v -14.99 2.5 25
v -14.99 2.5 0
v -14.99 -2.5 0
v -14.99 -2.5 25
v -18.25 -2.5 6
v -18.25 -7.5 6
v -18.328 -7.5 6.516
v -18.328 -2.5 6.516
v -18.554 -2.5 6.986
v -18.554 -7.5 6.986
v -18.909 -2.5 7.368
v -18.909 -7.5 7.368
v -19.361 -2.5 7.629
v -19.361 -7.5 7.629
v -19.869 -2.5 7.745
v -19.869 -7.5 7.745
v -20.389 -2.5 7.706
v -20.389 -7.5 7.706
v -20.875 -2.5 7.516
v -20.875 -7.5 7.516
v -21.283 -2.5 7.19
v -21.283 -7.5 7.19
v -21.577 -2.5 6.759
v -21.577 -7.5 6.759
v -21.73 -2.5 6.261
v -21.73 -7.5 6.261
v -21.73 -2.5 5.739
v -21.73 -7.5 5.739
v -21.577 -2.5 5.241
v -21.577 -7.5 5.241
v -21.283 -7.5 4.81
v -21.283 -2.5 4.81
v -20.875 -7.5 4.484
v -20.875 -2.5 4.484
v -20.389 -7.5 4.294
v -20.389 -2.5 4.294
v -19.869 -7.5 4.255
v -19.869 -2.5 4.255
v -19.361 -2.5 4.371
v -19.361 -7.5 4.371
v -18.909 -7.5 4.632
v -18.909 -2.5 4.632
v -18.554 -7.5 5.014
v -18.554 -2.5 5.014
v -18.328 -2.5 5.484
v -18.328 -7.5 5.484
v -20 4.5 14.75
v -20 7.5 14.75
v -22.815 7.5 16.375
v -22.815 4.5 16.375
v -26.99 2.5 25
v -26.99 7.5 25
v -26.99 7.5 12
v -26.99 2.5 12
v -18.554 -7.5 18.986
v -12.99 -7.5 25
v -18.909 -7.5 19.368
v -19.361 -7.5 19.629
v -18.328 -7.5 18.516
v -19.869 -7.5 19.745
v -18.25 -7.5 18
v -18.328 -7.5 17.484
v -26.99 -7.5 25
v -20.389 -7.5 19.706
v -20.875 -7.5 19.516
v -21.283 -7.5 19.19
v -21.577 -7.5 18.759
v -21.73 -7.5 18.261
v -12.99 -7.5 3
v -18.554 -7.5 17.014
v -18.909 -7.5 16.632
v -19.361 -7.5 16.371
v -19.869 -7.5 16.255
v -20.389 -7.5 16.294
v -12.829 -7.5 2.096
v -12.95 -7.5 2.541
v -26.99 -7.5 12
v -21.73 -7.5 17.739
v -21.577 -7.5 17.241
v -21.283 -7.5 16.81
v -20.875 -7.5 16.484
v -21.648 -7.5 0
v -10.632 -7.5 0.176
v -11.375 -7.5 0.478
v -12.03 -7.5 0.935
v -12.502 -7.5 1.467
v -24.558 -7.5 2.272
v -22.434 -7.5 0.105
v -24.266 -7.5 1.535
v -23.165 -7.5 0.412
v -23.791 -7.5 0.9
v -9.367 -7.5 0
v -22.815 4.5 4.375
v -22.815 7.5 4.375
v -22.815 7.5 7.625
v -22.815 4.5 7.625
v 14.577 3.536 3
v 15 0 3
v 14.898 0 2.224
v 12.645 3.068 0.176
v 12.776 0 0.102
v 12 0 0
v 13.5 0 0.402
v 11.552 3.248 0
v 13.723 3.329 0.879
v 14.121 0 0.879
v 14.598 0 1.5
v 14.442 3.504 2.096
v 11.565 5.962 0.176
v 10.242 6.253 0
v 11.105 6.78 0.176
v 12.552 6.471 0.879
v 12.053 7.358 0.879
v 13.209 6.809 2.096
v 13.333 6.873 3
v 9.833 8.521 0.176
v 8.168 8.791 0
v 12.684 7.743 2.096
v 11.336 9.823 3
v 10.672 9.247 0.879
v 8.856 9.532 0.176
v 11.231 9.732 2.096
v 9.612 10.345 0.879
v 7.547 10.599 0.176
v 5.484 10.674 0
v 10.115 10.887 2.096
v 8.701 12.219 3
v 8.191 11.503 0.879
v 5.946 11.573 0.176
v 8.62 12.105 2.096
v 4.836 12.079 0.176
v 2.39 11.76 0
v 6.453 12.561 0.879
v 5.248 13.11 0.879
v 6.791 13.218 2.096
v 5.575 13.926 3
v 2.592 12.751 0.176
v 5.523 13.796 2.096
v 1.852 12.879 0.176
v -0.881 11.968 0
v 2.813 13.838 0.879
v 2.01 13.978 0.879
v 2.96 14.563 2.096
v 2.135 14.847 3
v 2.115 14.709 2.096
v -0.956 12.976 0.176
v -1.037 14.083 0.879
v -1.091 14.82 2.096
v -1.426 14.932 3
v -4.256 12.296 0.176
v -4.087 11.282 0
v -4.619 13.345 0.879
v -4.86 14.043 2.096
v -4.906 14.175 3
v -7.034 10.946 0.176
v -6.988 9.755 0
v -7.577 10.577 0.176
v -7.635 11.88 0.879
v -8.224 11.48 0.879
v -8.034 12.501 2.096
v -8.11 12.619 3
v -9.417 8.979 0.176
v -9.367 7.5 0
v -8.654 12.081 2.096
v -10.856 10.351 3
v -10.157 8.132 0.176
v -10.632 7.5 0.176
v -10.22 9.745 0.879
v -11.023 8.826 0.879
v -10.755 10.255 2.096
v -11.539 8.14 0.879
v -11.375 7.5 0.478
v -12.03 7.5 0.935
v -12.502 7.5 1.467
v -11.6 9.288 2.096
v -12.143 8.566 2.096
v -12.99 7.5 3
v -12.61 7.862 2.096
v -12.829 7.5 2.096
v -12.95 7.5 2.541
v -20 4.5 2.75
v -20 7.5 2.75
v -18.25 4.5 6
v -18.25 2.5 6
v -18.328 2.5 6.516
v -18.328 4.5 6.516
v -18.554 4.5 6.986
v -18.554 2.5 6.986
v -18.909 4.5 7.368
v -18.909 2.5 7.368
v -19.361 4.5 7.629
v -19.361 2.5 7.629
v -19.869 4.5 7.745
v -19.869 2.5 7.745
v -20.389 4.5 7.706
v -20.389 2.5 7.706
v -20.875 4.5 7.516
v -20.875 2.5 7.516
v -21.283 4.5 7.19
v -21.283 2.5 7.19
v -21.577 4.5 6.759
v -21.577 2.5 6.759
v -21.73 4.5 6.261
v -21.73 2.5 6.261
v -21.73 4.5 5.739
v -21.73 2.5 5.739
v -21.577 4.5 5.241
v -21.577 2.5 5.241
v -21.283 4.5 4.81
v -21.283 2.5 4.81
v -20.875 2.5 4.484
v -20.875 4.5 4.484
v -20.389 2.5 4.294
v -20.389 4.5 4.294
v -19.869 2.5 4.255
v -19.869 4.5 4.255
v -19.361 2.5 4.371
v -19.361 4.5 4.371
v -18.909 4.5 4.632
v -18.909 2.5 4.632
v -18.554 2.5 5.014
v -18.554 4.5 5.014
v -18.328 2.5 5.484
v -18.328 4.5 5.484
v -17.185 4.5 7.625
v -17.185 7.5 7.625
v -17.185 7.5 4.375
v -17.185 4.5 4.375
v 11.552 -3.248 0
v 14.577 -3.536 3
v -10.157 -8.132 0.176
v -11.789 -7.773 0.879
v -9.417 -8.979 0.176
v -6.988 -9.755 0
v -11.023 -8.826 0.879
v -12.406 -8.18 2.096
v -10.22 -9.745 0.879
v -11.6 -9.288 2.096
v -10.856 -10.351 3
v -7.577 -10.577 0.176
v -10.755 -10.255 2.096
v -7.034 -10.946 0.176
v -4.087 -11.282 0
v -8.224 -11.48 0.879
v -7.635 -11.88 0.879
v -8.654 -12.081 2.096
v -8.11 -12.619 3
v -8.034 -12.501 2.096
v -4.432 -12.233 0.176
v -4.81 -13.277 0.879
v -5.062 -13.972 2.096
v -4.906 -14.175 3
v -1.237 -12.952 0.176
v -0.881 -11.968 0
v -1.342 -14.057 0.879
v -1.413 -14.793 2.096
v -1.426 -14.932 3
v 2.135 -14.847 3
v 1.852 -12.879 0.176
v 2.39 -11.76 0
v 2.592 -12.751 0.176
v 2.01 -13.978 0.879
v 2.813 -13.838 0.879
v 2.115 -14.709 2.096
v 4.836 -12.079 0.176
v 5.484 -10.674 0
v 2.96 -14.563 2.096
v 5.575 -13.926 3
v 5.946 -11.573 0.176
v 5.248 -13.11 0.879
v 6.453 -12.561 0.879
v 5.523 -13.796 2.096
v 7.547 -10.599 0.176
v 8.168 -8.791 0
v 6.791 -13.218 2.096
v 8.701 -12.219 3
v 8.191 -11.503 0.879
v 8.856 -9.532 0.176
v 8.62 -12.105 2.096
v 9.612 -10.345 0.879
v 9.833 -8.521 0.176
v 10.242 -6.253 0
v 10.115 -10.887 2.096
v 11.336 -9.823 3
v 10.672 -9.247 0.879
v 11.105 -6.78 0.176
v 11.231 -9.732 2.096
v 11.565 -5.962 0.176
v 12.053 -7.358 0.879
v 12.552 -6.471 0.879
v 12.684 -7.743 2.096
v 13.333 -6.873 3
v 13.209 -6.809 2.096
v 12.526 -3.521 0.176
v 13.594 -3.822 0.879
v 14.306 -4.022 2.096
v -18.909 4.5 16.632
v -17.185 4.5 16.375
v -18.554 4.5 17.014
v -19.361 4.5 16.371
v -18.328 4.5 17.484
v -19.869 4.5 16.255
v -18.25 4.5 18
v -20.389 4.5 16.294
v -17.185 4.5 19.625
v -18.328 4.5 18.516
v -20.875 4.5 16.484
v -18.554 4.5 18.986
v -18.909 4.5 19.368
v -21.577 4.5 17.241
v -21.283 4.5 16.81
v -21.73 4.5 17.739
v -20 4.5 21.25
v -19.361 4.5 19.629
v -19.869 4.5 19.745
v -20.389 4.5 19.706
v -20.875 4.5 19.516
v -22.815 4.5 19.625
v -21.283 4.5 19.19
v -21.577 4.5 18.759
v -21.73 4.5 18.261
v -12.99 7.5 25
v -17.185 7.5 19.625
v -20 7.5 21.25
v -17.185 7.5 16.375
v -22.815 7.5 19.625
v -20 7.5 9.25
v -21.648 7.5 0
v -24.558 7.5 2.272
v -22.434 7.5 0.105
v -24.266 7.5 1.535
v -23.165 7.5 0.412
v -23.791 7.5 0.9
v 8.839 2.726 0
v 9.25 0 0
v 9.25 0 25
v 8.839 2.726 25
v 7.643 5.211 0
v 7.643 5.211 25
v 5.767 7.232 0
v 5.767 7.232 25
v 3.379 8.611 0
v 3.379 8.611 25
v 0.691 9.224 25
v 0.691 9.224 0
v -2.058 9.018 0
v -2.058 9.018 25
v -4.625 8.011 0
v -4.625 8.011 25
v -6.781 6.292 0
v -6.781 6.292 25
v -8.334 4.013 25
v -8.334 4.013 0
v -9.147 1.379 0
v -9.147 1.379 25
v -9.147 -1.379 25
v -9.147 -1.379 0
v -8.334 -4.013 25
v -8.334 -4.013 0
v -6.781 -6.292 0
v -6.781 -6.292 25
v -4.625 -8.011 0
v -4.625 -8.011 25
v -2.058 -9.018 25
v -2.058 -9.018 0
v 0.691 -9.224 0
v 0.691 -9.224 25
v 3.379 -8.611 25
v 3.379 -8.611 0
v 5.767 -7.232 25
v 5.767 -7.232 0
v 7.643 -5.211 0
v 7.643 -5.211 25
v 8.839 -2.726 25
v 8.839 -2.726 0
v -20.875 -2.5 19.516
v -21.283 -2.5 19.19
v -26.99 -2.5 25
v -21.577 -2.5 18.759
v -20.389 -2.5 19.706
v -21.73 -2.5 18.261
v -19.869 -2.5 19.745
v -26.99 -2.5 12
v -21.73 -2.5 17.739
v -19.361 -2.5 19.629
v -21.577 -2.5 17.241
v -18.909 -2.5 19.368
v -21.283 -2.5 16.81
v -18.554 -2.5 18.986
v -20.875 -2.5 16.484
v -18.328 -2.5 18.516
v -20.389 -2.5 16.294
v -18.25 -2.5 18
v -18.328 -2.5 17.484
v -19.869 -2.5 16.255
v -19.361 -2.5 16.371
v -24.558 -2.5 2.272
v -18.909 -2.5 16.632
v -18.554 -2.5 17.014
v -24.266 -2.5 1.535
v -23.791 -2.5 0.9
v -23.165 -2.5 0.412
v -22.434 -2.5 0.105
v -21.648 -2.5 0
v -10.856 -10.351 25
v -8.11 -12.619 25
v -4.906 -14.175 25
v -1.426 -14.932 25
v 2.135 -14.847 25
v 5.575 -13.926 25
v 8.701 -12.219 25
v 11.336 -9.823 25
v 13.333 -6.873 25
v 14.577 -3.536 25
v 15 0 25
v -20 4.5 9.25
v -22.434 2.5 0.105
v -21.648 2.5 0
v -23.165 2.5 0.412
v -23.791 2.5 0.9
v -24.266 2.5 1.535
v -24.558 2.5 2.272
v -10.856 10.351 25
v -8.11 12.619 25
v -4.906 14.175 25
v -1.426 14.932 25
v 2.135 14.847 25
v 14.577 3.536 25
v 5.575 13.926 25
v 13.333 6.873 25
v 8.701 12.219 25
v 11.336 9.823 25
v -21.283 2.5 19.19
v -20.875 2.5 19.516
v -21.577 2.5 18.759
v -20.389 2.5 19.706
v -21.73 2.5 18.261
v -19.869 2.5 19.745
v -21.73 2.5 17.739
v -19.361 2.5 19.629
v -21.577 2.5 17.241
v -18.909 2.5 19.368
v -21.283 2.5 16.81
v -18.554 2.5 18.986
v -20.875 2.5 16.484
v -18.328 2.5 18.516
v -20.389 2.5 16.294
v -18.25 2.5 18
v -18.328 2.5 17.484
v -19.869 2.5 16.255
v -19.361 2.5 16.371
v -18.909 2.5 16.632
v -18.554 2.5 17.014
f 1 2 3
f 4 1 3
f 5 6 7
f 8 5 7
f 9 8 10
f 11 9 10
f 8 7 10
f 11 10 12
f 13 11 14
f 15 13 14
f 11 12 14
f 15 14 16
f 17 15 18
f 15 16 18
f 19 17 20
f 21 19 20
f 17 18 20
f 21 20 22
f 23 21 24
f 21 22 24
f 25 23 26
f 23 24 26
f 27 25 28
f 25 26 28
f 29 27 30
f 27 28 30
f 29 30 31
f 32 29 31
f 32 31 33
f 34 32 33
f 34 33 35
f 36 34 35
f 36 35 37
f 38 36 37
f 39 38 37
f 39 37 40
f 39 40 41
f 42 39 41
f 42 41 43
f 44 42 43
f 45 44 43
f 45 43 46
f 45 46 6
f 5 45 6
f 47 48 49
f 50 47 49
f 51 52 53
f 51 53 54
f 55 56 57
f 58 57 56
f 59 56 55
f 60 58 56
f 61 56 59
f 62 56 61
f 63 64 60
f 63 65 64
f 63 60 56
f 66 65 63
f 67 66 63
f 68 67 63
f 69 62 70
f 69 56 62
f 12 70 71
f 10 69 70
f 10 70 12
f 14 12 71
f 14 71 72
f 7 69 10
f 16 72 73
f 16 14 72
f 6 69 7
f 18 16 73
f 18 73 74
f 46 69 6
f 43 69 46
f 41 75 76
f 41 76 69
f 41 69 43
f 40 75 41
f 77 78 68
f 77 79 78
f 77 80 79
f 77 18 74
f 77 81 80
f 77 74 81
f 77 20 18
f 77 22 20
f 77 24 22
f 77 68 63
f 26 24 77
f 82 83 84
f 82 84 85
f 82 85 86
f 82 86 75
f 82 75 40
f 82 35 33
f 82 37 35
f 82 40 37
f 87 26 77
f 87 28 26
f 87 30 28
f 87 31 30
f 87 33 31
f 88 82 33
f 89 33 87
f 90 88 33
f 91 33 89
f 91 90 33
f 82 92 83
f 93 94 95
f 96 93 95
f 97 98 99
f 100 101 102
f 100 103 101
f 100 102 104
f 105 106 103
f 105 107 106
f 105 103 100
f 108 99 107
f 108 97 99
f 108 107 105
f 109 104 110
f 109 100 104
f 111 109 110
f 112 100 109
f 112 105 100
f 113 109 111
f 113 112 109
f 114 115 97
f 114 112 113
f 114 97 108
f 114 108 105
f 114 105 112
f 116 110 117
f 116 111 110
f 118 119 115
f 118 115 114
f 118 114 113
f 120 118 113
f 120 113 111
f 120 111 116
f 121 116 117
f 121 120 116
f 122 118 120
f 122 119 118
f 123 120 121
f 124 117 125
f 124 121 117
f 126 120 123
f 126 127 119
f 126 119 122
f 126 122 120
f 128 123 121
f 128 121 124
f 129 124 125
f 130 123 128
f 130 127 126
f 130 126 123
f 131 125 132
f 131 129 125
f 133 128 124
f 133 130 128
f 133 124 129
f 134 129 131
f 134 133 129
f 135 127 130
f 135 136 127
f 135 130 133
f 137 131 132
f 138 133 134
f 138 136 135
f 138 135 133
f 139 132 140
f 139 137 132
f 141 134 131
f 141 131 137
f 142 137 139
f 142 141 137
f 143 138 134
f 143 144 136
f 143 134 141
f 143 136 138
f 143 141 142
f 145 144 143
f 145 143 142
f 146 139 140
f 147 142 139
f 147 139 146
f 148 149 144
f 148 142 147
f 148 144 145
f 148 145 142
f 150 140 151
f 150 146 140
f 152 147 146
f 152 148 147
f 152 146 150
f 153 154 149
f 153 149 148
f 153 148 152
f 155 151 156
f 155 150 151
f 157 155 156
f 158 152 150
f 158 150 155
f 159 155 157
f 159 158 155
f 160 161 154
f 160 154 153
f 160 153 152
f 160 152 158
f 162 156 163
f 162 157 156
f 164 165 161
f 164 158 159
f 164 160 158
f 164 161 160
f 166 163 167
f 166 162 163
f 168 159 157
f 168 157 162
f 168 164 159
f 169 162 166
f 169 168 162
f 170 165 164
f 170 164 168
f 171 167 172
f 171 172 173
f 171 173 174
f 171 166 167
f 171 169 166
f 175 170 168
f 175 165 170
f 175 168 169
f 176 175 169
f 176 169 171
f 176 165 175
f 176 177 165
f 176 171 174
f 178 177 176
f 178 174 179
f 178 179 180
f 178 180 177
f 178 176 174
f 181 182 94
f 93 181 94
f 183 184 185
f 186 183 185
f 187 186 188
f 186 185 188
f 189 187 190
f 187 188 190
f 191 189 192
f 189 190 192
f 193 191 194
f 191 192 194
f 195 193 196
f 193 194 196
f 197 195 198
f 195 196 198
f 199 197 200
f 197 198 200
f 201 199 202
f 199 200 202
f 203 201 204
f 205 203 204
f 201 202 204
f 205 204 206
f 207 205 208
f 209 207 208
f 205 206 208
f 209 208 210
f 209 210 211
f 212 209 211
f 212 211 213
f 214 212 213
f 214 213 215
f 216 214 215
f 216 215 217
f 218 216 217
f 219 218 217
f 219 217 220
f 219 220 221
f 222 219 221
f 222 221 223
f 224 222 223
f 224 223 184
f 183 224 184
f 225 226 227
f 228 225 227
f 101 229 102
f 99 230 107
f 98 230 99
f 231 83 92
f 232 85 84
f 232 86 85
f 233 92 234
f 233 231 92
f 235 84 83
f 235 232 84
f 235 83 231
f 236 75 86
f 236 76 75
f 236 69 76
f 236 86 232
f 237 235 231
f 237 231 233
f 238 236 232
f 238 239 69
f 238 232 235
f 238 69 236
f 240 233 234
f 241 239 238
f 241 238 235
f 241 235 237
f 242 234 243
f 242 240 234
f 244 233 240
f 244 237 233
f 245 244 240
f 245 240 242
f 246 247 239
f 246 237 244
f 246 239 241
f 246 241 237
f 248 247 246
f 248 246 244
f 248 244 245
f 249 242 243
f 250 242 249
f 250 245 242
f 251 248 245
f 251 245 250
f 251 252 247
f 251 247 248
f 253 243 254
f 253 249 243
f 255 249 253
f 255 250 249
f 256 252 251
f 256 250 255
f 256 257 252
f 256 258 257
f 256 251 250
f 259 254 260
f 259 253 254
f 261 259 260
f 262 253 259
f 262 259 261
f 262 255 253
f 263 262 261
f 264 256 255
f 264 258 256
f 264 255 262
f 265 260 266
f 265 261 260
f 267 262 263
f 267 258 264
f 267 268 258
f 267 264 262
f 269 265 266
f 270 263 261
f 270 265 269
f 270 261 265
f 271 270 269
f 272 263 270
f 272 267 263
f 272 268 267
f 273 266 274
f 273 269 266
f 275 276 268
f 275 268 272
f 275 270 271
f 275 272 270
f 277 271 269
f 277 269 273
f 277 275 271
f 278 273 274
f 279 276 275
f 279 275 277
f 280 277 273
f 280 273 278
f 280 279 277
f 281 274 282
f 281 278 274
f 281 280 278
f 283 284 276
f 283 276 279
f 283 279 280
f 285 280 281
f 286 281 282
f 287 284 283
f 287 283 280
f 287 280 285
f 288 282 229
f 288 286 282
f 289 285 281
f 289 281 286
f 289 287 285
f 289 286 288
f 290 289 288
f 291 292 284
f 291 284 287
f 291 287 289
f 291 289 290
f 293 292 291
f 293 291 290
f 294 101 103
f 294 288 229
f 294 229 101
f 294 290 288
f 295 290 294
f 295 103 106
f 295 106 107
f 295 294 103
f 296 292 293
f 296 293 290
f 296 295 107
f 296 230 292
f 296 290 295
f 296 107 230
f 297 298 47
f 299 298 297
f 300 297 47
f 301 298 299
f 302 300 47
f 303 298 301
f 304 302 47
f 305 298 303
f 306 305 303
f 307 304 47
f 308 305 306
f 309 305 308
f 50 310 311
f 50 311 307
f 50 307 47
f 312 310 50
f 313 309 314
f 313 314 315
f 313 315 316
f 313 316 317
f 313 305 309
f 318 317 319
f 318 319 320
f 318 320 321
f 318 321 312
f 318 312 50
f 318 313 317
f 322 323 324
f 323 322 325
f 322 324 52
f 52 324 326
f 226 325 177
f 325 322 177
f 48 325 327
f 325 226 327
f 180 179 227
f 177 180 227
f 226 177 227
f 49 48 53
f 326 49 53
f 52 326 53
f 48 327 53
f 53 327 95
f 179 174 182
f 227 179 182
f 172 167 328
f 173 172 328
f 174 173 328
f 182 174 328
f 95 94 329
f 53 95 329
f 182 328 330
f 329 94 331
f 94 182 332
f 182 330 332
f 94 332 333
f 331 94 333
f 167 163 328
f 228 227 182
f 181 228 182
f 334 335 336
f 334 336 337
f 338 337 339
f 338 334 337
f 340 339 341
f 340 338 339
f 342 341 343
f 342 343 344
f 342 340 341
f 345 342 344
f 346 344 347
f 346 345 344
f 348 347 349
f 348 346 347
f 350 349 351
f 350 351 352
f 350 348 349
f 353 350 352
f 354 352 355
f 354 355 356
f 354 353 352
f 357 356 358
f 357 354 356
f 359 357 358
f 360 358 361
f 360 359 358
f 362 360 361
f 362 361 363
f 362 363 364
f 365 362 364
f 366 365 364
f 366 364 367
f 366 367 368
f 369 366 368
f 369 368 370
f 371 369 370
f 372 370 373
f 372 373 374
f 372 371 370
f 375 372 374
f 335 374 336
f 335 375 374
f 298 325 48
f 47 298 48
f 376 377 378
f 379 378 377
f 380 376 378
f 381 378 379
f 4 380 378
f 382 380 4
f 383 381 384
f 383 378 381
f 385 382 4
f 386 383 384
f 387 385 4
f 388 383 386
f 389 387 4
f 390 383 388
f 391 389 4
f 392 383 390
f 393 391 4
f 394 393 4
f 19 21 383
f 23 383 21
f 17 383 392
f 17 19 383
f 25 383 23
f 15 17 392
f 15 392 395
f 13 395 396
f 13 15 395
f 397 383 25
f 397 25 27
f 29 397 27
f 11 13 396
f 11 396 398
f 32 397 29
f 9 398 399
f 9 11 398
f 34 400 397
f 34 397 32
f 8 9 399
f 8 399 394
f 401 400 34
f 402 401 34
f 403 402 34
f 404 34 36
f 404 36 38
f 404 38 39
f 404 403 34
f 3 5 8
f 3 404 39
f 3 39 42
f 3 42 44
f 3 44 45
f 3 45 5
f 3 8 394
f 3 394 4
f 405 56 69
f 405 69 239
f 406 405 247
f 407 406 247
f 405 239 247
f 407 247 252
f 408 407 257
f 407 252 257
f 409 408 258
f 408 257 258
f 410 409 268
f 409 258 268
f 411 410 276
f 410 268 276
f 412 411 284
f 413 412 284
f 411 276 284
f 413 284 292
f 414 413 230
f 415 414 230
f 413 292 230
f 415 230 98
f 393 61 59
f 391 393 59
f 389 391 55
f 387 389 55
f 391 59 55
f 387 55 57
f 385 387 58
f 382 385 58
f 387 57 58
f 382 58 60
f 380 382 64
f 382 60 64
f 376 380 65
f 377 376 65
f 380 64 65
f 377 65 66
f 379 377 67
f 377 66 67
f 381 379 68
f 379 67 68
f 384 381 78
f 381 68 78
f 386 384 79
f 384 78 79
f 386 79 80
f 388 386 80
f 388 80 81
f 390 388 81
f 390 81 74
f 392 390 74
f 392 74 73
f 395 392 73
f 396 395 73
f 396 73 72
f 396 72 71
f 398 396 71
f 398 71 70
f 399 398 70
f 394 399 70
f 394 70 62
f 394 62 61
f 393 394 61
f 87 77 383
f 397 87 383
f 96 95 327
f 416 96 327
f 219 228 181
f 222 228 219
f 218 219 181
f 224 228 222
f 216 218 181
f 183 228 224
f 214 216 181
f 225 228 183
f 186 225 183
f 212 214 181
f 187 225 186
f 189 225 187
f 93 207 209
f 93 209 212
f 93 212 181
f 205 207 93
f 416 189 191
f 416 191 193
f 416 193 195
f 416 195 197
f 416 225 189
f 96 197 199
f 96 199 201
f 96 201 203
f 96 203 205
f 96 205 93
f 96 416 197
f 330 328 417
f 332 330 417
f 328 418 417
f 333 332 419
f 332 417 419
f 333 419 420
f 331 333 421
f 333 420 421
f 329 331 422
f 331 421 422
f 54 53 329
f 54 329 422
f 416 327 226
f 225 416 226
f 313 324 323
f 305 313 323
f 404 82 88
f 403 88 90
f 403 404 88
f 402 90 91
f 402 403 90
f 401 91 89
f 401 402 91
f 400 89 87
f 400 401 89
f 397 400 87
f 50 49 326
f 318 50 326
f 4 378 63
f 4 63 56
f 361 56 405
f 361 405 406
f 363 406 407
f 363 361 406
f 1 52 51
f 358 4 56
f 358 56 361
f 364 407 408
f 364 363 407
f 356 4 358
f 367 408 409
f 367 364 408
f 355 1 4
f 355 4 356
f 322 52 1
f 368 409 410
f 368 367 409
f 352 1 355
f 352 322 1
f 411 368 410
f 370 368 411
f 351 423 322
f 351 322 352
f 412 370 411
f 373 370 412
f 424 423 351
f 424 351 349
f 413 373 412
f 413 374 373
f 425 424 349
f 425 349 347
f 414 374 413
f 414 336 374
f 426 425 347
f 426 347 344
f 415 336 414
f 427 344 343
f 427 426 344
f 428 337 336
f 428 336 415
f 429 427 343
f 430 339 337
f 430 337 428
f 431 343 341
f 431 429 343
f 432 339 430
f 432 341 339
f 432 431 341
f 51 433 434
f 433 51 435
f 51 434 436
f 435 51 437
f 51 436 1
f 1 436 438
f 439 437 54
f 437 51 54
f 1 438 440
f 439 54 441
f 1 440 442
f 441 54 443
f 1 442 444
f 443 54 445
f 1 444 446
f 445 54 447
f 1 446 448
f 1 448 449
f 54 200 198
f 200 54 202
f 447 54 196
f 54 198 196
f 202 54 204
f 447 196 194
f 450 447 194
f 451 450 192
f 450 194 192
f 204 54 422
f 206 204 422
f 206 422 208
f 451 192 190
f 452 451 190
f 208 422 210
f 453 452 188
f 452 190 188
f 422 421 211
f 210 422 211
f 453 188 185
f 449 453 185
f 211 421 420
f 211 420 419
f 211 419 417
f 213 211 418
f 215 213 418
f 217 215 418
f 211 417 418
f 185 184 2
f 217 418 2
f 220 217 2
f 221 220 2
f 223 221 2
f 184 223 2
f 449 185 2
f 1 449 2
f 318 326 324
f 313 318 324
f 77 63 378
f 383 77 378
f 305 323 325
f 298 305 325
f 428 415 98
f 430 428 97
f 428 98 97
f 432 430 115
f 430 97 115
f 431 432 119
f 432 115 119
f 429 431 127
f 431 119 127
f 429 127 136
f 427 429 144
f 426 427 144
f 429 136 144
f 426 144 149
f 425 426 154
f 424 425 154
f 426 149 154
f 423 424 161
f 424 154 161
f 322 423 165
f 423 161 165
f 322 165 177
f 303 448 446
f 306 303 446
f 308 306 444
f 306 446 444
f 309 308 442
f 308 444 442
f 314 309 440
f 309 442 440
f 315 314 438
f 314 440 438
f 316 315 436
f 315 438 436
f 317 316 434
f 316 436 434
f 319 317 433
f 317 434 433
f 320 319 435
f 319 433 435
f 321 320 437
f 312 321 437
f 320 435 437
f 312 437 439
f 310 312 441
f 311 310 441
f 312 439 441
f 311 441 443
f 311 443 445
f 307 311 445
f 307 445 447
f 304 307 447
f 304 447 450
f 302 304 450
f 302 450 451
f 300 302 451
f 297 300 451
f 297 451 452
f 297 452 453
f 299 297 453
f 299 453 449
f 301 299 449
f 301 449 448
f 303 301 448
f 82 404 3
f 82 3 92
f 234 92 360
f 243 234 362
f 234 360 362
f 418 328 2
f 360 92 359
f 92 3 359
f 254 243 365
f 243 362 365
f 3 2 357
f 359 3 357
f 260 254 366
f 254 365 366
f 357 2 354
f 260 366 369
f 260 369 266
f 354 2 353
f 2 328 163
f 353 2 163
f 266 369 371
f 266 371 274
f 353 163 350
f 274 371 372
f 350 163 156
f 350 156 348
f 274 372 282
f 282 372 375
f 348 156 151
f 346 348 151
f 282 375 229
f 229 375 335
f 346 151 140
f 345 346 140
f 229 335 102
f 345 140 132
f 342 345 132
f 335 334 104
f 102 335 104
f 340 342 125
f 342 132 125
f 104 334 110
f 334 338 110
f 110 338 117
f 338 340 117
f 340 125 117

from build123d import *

# Parameters (mm, degrees)
SKETCH_R        = 9.25
PAD_DEPTH       = 25
SKETCH001_R     = 1.75
POCKET_DEPTH    = 22.501
POCKET001_DEPTH = 3
CHAMFER_SIZE2   = 12
CHAMFER_SIZE    = 3
FILLET_R        = 3
FILLET001_R     = 3


with BuildPart() as part:
    # Sketch → Pad (new body)
    with BuildSketch(Plane.XY):
        with BuildLine():
            ThreePointArc((15, 0), (3.882286, 14.488887), (-12.990381, 7.5))
            Line((-12.990381, 7.5), (-26.990381, 7.5))
            Line((-26.990381, 7.5), (-26.990381, 2.5))
            Line((-26.990381, 2.5), (-14.990381, 2.5))
            Line((-14.990381, 2.5), (-14.990381, -2.5))
            Line((-26.990381, -2.5), (-14.990381, -2.5))
            Line((-26.990381, -7.5), (-26.990381, -2.5))
            Line((-12.990381, -7.5), (-26.990381, -7.5))
            ThreePointArc((-12.990381, -7.5), (3.882286, -14.488887), (15, 0))
        make_face()
        Circle(SKETCH_R, mode=Mode.SUBTRACT)
    extrude(amount=PAD_DEPTH)

    # Sketch001 (on Face8 of Pad) → Pocket (cut, through all)
    with BuildSketch(Plane.XZ.offset(7.5)):
        with Locations((-20, 6)):
            Circle(SKETCH001_R)
        with Locations((-20, 18)):
            Circle(SKETCH001_R)
    extrude(amount=-POCKET_DEPTH, mode=Mode.SUBTRACT)

    # Sketch002 (on Face3 of Pocket) → Pocket001 (cut)
    with BuildSketch(Plane(origin=(0, 7.5, 0), x_dir=(-1, 0, 0), z_dir=(0, 1, 0))):
        Polygon((20, 2.75), (22.814583, 4.375), (22.814583, 7.625), (20, 9.25), (17.185417, 7.625), (17.185417, 4.375), align=None)
        Polygon((20, 14.75), (22.814583, 16.375), (22.814583, 19.625), (20, 21.25), (17.185417, 19.625), (17.185417, 16.375), align=None)
    extrude(amount=-POCKET001_DEPTH, mode=Mode.SUBTRACT)

    # Chamfer
    chamfer_edges = [part.edges().sort_by_distance(p)[0] for p in [
        (-26.990381, 5, 0),
        (-26.990381, -5, 0),
    ]]
    chamfer_side = part.faces().sort_by_distance((3.748719, 13.990411, 0))[0]
    chamfer(chamfer_edges, length=CHAMFER_SIZE, length2=CHAMFER_SIZE2, reference=chamfer_side)

    # Fillet
    fillet_edges = [part.edges().sort_by_distance(p)[0] for p in [
        (-23.990381, 5, 0),
        (-23.990381, -5, 0),
    ]]
    fillet(fillet_edges, radius=FILLET_R)

    # Fillet001
    fillet001_edges = [part.edges().sort_by_distance(p)[0] for p in [
        (3.882286, -14.488887, 0),
        (3.882286, 14.488887, 0),
    ]]
    fillet(fillet001_edges, radius=FILLET001_R)


solid = part.part
